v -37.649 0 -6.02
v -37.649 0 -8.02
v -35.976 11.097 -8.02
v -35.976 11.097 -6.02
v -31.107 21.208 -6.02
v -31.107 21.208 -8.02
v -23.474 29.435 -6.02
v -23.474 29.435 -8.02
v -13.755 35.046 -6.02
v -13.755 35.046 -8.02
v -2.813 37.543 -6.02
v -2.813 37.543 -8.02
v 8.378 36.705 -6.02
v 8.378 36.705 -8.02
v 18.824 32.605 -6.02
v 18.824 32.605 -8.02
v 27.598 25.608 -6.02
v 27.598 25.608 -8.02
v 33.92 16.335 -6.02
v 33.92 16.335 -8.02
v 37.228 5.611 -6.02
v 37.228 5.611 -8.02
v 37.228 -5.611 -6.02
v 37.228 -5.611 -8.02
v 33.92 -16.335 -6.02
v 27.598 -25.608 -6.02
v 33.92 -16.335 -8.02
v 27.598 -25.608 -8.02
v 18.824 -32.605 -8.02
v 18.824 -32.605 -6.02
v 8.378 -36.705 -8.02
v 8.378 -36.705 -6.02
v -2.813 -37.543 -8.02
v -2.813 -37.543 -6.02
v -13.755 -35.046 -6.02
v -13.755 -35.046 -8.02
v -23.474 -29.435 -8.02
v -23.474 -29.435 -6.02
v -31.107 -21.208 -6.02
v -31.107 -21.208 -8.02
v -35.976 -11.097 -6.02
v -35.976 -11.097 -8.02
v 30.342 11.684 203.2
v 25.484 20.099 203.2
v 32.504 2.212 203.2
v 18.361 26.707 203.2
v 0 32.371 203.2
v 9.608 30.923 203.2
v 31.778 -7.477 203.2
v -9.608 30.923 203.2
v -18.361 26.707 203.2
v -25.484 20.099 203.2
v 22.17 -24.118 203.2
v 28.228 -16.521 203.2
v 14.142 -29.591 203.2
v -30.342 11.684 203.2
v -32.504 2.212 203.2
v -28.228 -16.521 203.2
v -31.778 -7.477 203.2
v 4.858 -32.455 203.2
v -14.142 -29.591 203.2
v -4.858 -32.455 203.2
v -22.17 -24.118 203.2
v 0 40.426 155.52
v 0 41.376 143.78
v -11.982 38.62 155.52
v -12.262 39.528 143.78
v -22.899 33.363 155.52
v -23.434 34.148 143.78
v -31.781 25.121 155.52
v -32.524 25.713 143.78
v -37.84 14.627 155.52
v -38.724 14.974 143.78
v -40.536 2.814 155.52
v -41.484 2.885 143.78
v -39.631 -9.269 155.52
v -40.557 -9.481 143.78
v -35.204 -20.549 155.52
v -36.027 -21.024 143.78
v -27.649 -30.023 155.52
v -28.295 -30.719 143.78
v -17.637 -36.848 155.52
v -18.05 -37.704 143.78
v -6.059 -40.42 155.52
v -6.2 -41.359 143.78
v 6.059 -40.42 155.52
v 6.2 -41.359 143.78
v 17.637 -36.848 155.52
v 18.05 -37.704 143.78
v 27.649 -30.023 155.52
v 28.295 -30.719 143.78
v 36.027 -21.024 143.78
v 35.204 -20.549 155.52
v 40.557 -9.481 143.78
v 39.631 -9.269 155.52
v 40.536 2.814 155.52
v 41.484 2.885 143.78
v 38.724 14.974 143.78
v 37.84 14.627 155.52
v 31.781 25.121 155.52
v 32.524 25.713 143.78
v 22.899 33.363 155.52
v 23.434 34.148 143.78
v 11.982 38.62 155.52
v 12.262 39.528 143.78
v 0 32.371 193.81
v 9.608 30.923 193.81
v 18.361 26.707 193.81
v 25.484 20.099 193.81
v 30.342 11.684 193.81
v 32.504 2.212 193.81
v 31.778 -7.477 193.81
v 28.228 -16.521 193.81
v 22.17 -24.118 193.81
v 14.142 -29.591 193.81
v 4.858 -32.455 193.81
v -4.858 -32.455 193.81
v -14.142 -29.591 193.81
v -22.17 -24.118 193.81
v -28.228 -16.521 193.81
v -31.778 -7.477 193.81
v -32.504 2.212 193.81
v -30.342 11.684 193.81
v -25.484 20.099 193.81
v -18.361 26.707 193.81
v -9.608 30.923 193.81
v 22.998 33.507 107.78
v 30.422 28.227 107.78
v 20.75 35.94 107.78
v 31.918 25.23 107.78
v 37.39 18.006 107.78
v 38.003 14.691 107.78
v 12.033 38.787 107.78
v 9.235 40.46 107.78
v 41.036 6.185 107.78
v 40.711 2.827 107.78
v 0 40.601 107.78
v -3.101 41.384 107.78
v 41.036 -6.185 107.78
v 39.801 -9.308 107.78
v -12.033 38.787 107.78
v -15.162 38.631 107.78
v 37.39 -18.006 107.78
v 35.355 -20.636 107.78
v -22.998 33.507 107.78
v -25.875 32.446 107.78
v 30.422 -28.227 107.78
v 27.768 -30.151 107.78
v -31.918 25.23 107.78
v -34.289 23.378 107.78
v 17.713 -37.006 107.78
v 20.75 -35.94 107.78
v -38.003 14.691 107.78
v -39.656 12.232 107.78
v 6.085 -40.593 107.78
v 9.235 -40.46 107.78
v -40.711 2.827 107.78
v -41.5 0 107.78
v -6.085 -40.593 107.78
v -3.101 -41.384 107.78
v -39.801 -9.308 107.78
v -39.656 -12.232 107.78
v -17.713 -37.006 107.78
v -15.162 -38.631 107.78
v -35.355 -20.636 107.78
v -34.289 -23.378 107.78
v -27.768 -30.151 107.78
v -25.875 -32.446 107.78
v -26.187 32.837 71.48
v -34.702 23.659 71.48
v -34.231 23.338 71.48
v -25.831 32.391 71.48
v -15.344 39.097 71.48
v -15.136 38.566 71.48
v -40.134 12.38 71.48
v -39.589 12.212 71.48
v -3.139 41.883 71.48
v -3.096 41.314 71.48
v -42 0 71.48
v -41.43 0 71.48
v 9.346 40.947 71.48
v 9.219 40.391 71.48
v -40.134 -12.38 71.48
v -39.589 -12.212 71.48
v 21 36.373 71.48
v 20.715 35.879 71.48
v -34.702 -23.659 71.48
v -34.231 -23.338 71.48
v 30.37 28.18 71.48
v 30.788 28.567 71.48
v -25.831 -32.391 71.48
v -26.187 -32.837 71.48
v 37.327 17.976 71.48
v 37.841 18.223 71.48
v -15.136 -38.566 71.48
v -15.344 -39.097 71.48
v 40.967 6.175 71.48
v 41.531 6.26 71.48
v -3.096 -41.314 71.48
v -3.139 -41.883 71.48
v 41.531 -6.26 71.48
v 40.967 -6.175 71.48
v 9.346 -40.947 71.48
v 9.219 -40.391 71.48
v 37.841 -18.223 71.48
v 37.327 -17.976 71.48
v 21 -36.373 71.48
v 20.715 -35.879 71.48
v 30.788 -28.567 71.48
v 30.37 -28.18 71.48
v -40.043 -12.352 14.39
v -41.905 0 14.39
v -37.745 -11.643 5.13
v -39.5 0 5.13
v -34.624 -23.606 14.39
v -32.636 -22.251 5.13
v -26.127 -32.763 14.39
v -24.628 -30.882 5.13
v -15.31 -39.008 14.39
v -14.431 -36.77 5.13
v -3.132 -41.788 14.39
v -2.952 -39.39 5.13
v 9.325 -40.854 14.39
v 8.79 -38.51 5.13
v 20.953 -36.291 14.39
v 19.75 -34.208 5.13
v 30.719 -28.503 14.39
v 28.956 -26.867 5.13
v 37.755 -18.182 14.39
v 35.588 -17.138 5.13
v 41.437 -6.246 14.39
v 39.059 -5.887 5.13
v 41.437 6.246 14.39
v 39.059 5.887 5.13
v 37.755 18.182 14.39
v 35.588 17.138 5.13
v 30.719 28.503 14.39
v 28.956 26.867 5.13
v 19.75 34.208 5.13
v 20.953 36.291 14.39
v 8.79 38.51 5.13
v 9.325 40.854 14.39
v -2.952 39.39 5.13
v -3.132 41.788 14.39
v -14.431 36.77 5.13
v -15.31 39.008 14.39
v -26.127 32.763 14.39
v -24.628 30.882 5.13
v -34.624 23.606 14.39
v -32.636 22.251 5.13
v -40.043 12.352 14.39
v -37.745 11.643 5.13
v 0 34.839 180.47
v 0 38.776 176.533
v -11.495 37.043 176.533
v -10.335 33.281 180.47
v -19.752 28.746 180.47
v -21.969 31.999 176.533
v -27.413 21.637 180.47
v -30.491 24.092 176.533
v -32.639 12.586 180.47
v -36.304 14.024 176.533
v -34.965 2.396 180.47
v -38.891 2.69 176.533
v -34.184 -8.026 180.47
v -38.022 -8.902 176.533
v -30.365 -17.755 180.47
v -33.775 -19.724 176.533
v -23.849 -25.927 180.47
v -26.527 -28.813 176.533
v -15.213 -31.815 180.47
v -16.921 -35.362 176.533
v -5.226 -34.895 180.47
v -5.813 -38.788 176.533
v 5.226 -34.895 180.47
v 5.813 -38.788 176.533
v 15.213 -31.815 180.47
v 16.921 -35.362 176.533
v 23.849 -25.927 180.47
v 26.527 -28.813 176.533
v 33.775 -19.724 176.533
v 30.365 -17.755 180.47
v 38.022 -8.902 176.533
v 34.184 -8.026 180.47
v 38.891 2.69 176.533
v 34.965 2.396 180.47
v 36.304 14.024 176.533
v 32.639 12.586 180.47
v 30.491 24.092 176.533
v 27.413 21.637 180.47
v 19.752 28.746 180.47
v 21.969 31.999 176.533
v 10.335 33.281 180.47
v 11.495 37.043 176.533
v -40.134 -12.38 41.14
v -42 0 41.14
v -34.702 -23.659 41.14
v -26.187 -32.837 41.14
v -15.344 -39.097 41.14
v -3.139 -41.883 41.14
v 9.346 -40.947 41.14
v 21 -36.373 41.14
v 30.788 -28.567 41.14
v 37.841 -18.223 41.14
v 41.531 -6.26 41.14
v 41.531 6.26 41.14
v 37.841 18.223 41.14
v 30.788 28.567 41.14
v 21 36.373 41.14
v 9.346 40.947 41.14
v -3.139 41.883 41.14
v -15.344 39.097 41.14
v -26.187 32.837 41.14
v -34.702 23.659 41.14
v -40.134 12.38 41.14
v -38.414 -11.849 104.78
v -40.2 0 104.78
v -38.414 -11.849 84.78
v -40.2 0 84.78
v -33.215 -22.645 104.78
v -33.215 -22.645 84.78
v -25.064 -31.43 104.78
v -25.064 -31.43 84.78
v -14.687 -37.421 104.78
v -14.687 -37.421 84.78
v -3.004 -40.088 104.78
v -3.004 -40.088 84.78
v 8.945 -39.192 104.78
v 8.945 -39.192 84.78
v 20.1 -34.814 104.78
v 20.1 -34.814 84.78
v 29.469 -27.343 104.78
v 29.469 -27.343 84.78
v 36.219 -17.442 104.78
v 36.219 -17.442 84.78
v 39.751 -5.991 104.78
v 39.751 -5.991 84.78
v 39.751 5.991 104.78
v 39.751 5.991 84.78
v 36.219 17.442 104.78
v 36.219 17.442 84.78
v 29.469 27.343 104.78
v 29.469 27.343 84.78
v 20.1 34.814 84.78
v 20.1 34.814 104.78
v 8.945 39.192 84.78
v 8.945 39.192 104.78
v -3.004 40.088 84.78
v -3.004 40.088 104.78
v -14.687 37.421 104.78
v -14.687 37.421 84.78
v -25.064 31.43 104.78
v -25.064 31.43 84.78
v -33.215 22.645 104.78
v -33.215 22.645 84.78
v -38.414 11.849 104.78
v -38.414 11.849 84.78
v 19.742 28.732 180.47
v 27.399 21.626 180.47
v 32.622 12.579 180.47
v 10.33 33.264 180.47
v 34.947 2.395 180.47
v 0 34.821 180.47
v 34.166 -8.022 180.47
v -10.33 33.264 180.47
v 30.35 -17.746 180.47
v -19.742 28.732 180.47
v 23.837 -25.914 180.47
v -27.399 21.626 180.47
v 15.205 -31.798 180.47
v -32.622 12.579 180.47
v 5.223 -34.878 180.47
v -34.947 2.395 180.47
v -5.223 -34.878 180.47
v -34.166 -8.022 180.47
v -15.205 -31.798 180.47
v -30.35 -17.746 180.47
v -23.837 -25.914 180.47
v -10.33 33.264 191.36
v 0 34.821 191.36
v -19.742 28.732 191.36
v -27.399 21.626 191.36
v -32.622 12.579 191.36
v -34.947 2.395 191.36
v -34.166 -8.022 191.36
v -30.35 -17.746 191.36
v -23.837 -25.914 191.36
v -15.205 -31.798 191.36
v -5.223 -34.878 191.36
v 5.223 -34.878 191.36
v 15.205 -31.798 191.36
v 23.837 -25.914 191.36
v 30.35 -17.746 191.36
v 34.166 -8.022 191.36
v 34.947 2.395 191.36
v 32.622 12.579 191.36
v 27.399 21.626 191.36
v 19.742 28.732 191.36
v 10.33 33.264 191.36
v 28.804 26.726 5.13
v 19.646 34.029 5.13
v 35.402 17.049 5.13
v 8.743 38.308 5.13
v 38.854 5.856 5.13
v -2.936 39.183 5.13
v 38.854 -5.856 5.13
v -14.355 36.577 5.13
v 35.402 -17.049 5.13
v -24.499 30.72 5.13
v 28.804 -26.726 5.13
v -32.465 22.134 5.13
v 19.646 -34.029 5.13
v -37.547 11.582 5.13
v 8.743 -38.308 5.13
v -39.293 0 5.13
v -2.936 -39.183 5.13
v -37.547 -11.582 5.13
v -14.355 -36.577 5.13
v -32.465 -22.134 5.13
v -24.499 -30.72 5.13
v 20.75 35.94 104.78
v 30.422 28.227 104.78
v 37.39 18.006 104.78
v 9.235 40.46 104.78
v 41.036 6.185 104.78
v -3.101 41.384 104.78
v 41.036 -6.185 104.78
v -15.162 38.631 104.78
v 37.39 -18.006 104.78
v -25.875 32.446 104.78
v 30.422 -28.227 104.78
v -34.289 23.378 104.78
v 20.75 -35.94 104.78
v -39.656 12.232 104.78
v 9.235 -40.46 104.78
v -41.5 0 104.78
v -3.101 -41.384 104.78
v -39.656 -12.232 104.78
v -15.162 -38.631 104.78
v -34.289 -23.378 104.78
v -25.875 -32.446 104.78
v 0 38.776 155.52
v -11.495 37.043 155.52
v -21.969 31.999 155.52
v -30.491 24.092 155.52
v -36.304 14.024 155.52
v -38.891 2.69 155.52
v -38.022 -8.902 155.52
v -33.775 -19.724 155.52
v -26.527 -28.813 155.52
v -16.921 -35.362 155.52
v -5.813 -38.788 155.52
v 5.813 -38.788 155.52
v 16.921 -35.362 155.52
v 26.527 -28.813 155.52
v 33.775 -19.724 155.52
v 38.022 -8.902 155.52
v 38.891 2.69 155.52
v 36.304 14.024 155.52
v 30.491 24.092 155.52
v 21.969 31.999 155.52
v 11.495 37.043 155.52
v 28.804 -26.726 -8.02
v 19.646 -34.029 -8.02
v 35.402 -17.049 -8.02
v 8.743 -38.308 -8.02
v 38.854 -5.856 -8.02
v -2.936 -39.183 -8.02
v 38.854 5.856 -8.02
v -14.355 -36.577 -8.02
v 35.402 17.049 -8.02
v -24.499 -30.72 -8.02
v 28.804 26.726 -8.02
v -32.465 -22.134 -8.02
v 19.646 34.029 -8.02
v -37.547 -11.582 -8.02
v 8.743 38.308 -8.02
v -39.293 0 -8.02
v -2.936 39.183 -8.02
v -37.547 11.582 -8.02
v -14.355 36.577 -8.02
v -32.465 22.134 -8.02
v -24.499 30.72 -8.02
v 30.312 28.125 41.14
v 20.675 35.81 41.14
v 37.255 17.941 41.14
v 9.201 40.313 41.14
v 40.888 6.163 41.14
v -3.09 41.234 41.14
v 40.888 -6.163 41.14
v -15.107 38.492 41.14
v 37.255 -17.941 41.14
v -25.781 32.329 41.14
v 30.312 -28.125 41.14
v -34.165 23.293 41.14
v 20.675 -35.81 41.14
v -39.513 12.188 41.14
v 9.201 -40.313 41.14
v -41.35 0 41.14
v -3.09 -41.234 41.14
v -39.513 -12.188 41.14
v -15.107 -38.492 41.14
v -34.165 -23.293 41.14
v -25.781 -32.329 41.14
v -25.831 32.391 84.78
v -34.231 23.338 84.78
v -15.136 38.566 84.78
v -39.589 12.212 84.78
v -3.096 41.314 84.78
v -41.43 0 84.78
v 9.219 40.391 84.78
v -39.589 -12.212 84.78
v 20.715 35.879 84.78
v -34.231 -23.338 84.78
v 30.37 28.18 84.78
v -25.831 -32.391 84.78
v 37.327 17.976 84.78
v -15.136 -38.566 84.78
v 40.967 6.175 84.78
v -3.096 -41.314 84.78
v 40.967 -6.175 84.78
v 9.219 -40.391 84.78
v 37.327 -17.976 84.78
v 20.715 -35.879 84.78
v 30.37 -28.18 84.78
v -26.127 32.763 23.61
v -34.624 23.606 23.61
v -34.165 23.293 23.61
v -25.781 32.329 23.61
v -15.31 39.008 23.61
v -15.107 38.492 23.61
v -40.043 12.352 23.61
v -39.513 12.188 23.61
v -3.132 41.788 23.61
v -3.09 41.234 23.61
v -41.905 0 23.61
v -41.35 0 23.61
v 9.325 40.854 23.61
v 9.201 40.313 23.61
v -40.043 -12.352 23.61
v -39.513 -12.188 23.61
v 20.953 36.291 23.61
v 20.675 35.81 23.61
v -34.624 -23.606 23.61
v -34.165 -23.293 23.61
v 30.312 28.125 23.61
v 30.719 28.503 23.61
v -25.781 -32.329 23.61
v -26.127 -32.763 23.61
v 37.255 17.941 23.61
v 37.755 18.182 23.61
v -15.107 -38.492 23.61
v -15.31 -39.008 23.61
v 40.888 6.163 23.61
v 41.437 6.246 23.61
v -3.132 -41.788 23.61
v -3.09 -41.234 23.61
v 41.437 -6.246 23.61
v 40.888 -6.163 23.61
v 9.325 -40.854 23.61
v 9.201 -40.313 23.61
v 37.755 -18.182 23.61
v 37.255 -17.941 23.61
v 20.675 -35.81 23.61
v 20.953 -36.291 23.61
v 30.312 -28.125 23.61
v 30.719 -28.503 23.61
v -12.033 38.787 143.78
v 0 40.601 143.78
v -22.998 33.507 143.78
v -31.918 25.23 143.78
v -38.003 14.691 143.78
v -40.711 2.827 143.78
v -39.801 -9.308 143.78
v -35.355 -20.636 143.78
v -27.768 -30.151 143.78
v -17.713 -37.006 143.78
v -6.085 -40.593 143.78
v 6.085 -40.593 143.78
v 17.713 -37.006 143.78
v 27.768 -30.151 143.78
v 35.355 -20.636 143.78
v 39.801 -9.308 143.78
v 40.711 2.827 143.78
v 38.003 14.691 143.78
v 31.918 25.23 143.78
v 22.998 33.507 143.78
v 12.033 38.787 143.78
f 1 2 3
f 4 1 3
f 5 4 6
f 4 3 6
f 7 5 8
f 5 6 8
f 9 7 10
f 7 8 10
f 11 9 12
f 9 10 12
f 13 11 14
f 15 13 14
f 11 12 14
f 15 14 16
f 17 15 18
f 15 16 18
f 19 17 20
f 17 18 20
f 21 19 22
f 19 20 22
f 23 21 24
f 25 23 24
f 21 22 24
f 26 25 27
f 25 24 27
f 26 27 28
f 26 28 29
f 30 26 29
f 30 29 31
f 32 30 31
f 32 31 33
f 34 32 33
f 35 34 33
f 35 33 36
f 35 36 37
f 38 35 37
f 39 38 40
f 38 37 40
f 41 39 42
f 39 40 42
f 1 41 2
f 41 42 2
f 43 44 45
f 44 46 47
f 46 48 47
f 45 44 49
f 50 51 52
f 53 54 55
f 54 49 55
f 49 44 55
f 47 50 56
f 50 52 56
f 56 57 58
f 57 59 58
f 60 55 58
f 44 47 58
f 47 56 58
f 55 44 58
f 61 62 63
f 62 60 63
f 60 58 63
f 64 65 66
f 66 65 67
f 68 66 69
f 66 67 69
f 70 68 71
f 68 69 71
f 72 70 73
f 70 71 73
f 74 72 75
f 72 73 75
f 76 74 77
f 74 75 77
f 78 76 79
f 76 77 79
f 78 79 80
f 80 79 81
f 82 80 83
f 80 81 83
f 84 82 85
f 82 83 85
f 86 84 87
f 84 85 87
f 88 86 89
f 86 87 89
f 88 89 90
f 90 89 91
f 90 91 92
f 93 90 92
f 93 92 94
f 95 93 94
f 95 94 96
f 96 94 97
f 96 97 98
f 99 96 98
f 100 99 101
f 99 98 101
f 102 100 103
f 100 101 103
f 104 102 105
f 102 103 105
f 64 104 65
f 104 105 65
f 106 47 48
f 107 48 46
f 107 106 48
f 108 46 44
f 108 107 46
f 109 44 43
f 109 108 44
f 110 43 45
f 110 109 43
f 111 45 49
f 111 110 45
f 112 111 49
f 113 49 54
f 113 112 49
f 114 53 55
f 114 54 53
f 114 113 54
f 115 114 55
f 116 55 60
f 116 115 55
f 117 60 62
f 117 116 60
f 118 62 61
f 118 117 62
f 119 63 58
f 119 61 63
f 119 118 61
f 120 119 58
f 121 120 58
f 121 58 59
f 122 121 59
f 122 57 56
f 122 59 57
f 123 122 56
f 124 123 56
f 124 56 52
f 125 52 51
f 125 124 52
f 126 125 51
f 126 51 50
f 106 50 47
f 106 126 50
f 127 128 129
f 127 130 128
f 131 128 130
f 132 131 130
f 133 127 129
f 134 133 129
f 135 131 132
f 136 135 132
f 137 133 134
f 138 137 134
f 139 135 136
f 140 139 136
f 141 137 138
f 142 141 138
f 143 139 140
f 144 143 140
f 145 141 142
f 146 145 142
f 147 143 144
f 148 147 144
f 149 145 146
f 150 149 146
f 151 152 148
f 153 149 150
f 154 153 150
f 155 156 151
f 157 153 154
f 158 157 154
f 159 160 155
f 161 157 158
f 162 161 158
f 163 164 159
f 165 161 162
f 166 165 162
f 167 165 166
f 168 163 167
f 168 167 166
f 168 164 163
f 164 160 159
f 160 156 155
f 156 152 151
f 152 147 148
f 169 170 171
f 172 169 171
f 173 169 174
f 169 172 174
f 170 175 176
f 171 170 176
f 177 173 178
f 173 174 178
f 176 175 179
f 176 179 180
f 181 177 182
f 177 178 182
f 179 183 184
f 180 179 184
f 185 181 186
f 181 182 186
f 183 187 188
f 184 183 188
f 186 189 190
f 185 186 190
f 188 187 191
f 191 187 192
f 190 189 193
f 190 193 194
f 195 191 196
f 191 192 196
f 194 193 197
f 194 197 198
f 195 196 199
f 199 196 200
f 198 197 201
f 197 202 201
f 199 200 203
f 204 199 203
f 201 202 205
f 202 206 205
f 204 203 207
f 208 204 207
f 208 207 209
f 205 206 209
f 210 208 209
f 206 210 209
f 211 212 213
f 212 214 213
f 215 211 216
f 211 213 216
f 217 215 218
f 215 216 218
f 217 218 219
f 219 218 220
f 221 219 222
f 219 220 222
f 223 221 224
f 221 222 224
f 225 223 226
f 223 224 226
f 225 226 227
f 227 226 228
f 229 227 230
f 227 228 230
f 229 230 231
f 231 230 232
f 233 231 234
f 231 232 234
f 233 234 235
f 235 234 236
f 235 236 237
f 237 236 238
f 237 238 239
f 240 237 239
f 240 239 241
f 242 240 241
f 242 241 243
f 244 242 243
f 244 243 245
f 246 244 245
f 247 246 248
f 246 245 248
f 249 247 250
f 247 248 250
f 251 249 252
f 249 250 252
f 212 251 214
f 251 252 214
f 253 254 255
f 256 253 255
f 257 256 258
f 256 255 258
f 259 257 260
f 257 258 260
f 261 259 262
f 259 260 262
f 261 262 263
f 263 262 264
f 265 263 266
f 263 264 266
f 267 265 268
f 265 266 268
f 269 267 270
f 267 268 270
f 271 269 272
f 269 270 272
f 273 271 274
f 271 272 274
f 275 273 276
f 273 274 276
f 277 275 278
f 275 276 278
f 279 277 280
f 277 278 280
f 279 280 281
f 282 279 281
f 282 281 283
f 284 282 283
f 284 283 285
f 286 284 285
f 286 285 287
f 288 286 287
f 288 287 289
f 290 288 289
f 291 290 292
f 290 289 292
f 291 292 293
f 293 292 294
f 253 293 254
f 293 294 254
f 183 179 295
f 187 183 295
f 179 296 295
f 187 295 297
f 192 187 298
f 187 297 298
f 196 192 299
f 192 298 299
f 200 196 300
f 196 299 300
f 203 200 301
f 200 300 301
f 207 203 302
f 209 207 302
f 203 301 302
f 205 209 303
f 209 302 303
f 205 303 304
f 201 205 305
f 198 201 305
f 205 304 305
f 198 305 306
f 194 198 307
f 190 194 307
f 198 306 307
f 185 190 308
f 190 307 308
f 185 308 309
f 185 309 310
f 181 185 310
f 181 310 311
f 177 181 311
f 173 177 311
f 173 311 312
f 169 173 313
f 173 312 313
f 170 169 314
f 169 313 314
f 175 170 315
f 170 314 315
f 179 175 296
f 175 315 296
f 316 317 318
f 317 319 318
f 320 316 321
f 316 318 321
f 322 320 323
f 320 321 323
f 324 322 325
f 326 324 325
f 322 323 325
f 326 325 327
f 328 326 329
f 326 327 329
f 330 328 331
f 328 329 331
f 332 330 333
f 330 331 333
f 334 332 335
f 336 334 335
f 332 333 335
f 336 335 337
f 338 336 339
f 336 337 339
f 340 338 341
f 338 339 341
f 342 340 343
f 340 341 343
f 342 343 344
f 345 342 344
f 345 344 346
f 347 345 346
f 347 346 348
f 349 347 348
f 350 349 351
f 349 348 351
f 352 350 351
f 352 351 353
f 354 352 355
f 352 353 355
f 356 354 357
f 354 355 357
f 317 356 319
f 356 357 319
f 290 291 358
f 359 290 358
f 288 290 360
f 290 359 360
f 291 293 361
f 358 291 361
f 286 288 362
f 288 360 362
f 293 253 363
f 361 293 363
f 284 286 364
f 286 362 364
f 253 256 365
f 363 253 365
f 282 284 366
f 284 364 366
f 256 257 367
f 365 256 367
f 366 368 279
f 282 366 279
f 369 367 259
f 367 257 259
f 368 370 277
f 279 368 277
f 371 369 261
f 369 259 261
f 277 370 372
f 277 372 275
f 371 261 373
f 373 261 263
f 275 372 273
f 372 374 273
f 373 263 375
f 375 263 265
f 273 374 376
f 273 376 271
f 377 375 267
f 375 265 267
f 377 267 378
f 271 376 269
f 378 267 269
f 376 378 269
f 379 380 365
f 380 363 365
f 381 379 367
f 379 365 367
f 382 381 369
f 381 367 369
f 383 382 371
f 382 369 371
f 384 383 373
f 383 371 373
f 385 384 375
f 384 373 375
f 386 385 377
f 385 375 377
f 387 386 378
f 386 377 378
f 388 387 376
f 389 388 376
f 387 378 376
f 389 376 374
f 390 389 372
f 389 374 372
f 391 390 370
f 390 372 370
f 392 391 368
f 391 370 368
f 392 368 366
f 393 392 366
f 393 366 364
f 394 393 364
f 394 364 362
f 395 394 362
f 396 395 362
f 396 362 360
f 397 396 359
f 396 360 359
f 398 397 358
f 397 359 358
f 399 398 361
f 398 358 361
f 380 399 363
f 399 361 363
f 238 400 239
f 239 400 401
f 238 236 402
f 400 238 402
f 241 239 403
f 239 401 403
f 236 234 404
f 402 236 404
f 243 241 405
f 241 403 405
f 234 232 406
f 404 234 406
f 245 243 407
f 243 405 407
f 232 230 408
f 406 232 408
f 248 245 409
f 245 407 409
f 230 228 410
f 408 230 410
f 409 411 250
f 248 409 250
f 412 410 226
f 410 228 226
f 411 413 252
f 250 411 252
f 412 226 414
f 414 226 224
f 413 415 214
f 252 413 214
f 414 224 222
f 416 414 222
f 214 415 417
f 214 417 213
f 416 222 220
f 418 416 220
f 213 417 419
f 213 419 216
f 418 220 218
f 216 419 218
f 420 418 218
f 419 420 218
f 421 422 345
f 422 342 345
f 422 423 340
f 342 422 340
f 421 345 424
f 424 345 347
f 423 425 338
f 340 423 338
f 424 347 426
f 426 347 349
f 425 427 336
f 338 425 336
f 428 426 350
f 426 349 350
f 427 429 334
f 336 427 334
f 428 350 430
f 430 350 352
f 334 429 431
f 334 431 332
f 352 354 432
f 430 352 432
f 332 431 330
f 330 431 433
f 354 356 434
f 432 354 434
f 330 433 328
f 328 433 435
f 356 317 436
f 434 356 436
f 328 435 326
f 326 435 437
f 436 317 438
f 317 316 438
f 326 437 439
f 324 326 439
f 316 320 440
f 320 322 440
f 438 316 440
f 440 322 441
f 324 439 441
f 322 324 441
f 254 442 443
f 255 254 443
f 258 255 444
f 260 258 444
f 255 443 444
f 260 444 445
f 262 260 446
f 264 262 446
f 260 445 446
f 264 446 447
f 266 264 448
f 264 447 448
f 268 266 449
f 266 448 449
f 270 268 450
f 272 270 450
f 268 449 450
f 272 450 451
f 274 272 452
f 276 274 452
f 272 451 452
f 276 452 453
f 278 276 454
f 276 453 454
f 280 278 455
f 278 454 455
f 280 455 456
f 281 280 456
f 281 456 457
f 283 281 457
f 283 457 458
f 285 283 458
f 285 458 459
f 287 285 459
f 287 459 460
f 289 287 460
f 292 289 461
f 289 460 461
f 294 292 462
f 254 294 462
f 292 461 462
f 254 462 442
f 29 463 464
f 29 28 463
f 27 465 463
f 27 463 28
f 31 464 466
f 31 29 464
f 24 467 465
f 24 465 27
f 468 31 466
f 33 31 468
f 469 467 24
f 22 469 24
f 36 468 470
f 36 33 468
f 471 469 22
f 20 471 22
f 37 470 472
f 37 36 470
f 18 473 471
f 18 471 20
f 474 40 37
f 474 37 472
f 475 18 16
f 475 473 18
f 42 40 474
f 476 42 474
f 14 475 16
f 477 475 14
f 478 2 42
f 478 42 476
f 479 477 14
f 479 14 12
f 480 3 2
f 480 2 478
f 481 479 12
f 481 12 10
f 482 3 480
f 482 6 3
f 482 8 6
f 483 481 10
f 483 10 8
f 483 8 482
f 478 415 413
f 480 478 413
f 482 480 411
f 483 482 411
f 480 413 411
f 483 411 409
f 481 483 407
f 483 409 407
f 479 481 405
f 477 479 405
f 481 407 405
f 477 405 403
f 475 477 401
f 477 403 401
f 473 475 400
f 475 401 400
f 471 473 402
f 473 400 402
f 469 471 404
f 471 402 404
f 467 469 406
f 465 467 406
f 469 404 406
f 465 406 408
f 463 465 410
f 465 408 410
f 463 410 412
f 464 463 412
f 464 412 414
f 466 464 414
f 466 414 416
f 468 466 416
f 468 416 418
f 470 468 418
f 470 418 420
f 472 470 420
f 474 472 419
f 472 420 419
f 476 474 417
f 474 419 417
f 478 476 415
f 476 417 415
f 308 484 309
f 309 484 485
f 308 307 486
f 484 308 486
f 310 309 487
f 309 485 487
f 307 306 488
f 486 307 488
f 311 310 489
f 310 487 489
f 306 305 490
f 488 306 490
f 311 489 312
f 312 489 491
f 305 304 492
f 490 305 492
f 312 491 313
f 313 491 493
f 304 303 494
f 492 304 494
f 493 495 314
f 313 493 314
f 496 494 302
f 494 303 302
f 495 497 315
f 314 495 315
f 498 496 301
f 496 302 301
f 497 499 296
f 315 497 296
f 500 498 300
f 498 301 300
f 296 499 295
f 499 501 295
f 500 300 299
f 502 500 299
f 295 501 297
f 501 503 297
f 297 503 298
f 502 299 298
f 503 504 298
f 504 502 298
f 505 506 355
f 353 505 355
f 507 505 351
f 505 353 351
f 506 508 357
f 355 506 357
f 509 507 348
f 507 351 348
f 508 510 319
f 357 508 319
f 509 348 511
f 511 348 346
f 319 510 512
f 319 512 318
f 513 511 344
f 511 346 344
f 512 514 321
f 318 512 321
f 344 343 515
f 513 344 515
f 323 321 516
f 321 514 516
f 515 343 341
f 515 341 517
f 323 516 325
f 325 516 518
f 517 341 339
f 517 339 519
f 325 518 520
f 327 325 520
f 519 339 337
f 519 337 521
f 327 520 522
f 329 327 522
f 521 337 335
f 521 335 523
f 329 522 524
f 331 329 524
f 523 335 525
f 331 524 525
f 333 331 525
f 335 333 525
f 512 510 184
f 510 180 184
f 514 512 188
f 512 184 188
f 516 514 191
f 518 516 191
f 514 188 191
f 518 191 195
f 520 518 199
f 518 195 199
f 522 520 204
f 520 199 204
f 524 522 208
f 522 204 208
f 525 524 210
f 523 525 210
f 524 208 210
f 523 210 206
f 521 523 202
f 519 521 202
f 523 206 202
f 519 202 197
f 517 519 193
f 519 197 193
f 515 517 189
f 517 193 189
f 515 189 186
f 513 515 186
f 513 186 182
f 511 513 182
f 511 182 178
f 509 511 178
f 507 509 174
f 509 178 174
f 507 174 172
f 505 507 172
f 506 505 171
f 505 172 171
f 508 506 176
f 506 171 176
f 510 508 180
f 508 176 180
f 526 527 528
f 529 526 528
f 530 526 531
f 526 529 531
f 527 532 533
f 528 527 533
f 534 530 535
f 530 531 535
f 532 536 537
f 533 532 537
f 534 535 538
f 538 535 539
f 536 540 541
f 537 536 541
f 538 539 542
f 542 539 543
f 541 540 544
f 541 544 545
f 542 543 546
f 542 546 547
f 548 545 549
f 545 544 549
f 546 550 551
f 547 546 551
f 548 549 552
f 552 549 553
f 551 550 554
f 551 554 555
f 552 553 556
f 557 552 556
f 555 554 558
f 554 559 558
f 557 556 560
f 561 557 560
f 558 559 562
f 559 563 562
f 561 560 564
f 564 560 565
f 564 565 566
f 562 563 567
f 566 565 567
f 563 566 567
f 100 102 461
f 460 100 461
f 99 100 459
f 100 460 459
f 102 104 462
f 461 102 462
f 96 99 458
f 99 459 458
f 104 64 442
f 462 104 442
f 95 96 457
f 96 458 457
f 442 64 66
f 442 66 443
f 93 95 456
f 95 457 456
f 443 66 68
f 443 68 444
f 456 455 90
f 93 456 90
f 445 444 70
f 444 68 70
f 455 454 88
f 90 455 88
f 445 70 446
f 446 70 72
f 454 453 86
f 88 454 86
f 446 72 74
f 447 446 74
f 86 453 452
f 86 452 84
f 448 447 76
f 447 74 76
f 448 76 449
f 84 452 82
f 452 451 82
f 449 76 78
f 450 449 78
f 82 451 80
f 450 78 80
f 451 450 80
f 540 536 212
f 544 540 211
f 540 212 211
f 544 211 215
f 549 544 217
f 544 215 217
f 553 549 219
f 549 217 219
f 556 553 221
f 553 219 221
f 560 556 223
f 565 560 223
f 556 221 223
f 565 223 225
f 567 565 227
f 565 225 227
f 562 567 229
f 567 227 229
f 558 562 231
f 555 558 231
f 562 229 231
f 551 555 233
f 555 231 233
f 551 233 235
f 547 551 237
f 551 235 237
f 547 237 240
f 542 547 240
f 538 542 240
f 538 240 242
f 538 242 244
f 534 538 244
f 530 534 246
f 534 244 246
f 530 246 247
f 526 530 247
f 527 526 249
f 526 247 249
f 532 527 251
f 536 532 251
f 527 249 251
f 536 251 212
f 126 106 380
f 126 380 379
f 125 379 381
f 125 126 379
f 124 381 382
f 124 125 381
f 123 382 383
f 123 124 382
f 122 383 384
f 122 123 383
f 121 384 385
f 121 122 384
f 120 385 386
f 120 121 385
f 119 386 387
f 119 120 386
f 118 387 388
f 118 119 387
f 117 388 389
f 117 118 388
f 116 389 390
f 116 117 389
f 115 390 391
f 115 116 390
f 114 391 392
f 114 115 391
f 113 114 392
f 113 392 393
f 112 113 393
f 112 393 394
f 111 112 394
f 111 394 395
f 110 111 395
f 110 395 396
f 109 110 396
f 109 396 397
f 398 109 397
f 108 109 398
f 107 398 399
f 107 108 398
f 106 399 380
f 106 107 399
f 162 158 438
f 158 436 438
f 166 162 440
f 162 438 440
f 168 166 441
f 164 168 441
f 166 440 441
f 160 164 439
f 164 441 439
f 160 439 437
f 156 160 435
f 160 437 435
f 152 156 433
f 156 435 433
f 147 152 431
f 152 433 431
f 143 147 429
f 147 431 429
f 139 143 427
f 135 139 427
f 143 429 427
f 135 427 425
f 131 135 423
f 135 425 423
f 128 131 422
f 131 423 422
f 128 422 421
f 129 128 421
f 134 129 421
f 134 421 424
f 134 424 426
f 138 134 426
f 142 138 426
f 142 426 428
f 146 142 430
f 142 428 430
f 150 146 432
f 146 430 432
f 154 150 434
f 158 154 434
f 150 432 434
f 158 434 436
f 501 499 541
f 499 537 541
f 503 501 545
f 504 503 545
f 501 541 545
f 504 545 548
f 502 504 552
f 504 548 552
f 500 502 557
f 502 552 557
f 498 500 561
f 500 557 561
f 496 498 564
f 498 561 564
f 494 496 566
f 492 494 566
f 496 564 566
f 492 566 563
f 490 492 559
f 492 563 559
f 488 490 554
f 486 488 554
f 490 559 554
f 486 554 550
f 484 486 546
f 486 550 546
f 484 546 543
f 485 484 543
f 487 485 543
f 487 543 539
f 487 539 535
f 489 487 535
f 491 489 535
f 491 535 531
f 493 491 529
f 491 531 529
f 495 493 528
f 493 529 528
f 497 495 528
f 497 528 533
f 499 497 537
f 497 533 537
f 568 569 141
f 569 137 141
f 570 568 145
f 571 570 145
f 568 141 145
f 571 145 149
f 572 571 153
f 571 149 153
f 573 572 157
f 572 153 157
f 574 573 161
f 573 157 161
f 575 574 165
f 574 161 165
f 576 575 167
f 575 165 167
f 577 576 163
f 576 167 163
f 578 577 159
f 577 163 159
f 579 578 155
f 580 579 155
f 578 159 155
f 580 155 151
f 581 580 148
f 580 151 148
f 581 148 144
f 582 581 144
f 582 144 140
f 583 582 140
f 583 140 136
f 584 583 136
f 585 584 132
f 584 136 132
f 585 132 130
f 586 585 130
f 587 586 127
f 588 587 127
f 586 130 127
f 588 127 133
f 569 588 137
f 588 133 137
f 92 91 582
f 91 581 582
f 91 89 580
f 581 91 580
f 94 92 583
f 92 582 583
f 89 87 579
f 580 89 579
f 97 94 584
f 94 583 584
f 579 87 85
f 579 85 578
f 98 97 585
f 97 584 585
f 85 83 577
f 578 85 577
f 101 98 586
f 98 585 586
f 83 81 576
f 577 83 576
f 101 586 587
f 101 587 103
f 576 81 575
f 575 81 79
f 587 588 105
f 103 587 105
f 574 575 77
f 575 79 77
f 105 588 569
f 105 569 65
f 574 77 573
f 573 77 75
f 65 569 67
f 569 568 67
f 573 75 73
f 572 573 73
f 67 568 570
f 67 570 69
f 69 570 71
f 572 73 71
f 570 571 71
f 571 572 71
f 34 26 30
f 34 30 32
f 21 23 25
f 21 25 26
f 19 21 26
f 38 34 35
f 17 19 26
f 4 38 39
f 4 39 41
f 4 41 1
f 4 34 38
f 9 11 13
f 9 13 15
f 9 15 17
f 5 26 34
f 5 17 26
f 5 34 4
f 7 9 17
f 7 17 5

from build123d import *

# Parameters (mm, degrees)
CHAMFER1_SIZE       = 3.937
CHAMFER2_SIZE       = 2.54
SKETCH3_R           = 39.292876354
BOSS_EXTRUDE1_DEPTH = 13.15
SKETCH4_R           = 37.648699114
CUT_EXTRUDE1_DEPTH  = 2


with BuildPart() as part:
    # Sketch1 → Revolve1 (revolve)
    with BuildSketch(Plane(origin=(0, 0, 0), x_dir=(0, 0, -1), z_dir=(1, 0, 0))):
        Polygon((-107.78, -0.223974787), (-203.2, -0.223974787), (-203.2, 32.371025213), (-193.9, 32.371025213), (-193.9, 34.821025213), (-180.47, 34.821025213), (-180.47, 38.776025213), (-155.52, 38.776025213), (-155.52, 40.426025213), (-143.78, 41.376025213), (-143.78, 40.601025213), (-107.78, 40.601025213), align=None)
    revolve(axis=Axis((0, -0.223974787, 107.78), (0, 0, 1)))

    # Chamfer1
    chamfer1_edges = [part.edges().sort_by_distance(p)[0] for p in [
        (0, -39.223974787, 180.47),
    ]]
    chamfer(chamfer1_edges, length=CHAMFER1_SIZE)

    # Chamfer2
    # the kernel refuses this chamfer: 2.54 mm, written as the material it takes off along each edge
    with BuildSketch(Plane(origin=(0, -0.223974787, 193.9), x_dir=(0, 1, 0), z_dir=(1, 0, 0))) as chamfer2_piece_1_section:
        Polygon((35.045, -CHAMFER2_SIZE), (35.045 - CHAMFER2_SIZE, 0), (35.045, 0), align=None)
    chamfer2_piece_1 = revolve(axis=Axis((0, -0.223974787, 193.9), (0, 0, 1)), mode=Mode.PRIVATE)
    chamfer2_piece_1 = chamfer2_piece_1 - Plane(origin=(0, -0.223974787, 192.613574864), x_dir=(0, 1, 0), z_dir=(0, 0, -1)) * Cylinder(32.595, 141, mode=Mode.PRIVATE)
    add(chamfer2_piece_1, mode=Mode.SUBTRACT)

    # Sketch2 → Revolve2 (revolve)
    with BuildSketch(Plane(origin=(0, 0, 0), x_dir=(1, 0, 0), z_dir=(0, 1, 0))):
        Polygon((-40.825, -107.78), (-41.5, -107.78), (-41.5, -104.78), (-40.2, -104.78), (-40.2, -84.78), (-41.43, -84.78), (-41.43, -71.48), (-42, -71.48), (-42, -41.14), (-41.35, -41.14), (-41.35, -23.61), (-41.905, -23.61), (-41.905, -14.39), (-39.5, -5.13), (0, -5.13), (0, -107.78), align=None)
    revolve(axis=Axis((0, 0, 5.13), (0, 0, 1)))

    # Sketch3 → Boss-Extrude1 (add)
    with BuildSketch(Plane(origin=(0, 0, 5.13), x_dir=(-1, 0, 0), z_dir=(0, 0, -1))):
        Circle(SKETCH3_R)
    extrude(amount=BOSS_EXTRUDE1_DEPTH)

    # Sketch4 → Cut-Extrude1 (cut)
    with BuildSketch(Plane(origin=(0, 0, -8.02), x_dir=(-1, 0, 0), z_dir=(0, 0, -1))):
        Circle(SKETCH4_R)
    extrude(amount=-CUT_EXTRUDE1_DEPTH, mode=Mode.SUBTRACT)


solid = part.part
